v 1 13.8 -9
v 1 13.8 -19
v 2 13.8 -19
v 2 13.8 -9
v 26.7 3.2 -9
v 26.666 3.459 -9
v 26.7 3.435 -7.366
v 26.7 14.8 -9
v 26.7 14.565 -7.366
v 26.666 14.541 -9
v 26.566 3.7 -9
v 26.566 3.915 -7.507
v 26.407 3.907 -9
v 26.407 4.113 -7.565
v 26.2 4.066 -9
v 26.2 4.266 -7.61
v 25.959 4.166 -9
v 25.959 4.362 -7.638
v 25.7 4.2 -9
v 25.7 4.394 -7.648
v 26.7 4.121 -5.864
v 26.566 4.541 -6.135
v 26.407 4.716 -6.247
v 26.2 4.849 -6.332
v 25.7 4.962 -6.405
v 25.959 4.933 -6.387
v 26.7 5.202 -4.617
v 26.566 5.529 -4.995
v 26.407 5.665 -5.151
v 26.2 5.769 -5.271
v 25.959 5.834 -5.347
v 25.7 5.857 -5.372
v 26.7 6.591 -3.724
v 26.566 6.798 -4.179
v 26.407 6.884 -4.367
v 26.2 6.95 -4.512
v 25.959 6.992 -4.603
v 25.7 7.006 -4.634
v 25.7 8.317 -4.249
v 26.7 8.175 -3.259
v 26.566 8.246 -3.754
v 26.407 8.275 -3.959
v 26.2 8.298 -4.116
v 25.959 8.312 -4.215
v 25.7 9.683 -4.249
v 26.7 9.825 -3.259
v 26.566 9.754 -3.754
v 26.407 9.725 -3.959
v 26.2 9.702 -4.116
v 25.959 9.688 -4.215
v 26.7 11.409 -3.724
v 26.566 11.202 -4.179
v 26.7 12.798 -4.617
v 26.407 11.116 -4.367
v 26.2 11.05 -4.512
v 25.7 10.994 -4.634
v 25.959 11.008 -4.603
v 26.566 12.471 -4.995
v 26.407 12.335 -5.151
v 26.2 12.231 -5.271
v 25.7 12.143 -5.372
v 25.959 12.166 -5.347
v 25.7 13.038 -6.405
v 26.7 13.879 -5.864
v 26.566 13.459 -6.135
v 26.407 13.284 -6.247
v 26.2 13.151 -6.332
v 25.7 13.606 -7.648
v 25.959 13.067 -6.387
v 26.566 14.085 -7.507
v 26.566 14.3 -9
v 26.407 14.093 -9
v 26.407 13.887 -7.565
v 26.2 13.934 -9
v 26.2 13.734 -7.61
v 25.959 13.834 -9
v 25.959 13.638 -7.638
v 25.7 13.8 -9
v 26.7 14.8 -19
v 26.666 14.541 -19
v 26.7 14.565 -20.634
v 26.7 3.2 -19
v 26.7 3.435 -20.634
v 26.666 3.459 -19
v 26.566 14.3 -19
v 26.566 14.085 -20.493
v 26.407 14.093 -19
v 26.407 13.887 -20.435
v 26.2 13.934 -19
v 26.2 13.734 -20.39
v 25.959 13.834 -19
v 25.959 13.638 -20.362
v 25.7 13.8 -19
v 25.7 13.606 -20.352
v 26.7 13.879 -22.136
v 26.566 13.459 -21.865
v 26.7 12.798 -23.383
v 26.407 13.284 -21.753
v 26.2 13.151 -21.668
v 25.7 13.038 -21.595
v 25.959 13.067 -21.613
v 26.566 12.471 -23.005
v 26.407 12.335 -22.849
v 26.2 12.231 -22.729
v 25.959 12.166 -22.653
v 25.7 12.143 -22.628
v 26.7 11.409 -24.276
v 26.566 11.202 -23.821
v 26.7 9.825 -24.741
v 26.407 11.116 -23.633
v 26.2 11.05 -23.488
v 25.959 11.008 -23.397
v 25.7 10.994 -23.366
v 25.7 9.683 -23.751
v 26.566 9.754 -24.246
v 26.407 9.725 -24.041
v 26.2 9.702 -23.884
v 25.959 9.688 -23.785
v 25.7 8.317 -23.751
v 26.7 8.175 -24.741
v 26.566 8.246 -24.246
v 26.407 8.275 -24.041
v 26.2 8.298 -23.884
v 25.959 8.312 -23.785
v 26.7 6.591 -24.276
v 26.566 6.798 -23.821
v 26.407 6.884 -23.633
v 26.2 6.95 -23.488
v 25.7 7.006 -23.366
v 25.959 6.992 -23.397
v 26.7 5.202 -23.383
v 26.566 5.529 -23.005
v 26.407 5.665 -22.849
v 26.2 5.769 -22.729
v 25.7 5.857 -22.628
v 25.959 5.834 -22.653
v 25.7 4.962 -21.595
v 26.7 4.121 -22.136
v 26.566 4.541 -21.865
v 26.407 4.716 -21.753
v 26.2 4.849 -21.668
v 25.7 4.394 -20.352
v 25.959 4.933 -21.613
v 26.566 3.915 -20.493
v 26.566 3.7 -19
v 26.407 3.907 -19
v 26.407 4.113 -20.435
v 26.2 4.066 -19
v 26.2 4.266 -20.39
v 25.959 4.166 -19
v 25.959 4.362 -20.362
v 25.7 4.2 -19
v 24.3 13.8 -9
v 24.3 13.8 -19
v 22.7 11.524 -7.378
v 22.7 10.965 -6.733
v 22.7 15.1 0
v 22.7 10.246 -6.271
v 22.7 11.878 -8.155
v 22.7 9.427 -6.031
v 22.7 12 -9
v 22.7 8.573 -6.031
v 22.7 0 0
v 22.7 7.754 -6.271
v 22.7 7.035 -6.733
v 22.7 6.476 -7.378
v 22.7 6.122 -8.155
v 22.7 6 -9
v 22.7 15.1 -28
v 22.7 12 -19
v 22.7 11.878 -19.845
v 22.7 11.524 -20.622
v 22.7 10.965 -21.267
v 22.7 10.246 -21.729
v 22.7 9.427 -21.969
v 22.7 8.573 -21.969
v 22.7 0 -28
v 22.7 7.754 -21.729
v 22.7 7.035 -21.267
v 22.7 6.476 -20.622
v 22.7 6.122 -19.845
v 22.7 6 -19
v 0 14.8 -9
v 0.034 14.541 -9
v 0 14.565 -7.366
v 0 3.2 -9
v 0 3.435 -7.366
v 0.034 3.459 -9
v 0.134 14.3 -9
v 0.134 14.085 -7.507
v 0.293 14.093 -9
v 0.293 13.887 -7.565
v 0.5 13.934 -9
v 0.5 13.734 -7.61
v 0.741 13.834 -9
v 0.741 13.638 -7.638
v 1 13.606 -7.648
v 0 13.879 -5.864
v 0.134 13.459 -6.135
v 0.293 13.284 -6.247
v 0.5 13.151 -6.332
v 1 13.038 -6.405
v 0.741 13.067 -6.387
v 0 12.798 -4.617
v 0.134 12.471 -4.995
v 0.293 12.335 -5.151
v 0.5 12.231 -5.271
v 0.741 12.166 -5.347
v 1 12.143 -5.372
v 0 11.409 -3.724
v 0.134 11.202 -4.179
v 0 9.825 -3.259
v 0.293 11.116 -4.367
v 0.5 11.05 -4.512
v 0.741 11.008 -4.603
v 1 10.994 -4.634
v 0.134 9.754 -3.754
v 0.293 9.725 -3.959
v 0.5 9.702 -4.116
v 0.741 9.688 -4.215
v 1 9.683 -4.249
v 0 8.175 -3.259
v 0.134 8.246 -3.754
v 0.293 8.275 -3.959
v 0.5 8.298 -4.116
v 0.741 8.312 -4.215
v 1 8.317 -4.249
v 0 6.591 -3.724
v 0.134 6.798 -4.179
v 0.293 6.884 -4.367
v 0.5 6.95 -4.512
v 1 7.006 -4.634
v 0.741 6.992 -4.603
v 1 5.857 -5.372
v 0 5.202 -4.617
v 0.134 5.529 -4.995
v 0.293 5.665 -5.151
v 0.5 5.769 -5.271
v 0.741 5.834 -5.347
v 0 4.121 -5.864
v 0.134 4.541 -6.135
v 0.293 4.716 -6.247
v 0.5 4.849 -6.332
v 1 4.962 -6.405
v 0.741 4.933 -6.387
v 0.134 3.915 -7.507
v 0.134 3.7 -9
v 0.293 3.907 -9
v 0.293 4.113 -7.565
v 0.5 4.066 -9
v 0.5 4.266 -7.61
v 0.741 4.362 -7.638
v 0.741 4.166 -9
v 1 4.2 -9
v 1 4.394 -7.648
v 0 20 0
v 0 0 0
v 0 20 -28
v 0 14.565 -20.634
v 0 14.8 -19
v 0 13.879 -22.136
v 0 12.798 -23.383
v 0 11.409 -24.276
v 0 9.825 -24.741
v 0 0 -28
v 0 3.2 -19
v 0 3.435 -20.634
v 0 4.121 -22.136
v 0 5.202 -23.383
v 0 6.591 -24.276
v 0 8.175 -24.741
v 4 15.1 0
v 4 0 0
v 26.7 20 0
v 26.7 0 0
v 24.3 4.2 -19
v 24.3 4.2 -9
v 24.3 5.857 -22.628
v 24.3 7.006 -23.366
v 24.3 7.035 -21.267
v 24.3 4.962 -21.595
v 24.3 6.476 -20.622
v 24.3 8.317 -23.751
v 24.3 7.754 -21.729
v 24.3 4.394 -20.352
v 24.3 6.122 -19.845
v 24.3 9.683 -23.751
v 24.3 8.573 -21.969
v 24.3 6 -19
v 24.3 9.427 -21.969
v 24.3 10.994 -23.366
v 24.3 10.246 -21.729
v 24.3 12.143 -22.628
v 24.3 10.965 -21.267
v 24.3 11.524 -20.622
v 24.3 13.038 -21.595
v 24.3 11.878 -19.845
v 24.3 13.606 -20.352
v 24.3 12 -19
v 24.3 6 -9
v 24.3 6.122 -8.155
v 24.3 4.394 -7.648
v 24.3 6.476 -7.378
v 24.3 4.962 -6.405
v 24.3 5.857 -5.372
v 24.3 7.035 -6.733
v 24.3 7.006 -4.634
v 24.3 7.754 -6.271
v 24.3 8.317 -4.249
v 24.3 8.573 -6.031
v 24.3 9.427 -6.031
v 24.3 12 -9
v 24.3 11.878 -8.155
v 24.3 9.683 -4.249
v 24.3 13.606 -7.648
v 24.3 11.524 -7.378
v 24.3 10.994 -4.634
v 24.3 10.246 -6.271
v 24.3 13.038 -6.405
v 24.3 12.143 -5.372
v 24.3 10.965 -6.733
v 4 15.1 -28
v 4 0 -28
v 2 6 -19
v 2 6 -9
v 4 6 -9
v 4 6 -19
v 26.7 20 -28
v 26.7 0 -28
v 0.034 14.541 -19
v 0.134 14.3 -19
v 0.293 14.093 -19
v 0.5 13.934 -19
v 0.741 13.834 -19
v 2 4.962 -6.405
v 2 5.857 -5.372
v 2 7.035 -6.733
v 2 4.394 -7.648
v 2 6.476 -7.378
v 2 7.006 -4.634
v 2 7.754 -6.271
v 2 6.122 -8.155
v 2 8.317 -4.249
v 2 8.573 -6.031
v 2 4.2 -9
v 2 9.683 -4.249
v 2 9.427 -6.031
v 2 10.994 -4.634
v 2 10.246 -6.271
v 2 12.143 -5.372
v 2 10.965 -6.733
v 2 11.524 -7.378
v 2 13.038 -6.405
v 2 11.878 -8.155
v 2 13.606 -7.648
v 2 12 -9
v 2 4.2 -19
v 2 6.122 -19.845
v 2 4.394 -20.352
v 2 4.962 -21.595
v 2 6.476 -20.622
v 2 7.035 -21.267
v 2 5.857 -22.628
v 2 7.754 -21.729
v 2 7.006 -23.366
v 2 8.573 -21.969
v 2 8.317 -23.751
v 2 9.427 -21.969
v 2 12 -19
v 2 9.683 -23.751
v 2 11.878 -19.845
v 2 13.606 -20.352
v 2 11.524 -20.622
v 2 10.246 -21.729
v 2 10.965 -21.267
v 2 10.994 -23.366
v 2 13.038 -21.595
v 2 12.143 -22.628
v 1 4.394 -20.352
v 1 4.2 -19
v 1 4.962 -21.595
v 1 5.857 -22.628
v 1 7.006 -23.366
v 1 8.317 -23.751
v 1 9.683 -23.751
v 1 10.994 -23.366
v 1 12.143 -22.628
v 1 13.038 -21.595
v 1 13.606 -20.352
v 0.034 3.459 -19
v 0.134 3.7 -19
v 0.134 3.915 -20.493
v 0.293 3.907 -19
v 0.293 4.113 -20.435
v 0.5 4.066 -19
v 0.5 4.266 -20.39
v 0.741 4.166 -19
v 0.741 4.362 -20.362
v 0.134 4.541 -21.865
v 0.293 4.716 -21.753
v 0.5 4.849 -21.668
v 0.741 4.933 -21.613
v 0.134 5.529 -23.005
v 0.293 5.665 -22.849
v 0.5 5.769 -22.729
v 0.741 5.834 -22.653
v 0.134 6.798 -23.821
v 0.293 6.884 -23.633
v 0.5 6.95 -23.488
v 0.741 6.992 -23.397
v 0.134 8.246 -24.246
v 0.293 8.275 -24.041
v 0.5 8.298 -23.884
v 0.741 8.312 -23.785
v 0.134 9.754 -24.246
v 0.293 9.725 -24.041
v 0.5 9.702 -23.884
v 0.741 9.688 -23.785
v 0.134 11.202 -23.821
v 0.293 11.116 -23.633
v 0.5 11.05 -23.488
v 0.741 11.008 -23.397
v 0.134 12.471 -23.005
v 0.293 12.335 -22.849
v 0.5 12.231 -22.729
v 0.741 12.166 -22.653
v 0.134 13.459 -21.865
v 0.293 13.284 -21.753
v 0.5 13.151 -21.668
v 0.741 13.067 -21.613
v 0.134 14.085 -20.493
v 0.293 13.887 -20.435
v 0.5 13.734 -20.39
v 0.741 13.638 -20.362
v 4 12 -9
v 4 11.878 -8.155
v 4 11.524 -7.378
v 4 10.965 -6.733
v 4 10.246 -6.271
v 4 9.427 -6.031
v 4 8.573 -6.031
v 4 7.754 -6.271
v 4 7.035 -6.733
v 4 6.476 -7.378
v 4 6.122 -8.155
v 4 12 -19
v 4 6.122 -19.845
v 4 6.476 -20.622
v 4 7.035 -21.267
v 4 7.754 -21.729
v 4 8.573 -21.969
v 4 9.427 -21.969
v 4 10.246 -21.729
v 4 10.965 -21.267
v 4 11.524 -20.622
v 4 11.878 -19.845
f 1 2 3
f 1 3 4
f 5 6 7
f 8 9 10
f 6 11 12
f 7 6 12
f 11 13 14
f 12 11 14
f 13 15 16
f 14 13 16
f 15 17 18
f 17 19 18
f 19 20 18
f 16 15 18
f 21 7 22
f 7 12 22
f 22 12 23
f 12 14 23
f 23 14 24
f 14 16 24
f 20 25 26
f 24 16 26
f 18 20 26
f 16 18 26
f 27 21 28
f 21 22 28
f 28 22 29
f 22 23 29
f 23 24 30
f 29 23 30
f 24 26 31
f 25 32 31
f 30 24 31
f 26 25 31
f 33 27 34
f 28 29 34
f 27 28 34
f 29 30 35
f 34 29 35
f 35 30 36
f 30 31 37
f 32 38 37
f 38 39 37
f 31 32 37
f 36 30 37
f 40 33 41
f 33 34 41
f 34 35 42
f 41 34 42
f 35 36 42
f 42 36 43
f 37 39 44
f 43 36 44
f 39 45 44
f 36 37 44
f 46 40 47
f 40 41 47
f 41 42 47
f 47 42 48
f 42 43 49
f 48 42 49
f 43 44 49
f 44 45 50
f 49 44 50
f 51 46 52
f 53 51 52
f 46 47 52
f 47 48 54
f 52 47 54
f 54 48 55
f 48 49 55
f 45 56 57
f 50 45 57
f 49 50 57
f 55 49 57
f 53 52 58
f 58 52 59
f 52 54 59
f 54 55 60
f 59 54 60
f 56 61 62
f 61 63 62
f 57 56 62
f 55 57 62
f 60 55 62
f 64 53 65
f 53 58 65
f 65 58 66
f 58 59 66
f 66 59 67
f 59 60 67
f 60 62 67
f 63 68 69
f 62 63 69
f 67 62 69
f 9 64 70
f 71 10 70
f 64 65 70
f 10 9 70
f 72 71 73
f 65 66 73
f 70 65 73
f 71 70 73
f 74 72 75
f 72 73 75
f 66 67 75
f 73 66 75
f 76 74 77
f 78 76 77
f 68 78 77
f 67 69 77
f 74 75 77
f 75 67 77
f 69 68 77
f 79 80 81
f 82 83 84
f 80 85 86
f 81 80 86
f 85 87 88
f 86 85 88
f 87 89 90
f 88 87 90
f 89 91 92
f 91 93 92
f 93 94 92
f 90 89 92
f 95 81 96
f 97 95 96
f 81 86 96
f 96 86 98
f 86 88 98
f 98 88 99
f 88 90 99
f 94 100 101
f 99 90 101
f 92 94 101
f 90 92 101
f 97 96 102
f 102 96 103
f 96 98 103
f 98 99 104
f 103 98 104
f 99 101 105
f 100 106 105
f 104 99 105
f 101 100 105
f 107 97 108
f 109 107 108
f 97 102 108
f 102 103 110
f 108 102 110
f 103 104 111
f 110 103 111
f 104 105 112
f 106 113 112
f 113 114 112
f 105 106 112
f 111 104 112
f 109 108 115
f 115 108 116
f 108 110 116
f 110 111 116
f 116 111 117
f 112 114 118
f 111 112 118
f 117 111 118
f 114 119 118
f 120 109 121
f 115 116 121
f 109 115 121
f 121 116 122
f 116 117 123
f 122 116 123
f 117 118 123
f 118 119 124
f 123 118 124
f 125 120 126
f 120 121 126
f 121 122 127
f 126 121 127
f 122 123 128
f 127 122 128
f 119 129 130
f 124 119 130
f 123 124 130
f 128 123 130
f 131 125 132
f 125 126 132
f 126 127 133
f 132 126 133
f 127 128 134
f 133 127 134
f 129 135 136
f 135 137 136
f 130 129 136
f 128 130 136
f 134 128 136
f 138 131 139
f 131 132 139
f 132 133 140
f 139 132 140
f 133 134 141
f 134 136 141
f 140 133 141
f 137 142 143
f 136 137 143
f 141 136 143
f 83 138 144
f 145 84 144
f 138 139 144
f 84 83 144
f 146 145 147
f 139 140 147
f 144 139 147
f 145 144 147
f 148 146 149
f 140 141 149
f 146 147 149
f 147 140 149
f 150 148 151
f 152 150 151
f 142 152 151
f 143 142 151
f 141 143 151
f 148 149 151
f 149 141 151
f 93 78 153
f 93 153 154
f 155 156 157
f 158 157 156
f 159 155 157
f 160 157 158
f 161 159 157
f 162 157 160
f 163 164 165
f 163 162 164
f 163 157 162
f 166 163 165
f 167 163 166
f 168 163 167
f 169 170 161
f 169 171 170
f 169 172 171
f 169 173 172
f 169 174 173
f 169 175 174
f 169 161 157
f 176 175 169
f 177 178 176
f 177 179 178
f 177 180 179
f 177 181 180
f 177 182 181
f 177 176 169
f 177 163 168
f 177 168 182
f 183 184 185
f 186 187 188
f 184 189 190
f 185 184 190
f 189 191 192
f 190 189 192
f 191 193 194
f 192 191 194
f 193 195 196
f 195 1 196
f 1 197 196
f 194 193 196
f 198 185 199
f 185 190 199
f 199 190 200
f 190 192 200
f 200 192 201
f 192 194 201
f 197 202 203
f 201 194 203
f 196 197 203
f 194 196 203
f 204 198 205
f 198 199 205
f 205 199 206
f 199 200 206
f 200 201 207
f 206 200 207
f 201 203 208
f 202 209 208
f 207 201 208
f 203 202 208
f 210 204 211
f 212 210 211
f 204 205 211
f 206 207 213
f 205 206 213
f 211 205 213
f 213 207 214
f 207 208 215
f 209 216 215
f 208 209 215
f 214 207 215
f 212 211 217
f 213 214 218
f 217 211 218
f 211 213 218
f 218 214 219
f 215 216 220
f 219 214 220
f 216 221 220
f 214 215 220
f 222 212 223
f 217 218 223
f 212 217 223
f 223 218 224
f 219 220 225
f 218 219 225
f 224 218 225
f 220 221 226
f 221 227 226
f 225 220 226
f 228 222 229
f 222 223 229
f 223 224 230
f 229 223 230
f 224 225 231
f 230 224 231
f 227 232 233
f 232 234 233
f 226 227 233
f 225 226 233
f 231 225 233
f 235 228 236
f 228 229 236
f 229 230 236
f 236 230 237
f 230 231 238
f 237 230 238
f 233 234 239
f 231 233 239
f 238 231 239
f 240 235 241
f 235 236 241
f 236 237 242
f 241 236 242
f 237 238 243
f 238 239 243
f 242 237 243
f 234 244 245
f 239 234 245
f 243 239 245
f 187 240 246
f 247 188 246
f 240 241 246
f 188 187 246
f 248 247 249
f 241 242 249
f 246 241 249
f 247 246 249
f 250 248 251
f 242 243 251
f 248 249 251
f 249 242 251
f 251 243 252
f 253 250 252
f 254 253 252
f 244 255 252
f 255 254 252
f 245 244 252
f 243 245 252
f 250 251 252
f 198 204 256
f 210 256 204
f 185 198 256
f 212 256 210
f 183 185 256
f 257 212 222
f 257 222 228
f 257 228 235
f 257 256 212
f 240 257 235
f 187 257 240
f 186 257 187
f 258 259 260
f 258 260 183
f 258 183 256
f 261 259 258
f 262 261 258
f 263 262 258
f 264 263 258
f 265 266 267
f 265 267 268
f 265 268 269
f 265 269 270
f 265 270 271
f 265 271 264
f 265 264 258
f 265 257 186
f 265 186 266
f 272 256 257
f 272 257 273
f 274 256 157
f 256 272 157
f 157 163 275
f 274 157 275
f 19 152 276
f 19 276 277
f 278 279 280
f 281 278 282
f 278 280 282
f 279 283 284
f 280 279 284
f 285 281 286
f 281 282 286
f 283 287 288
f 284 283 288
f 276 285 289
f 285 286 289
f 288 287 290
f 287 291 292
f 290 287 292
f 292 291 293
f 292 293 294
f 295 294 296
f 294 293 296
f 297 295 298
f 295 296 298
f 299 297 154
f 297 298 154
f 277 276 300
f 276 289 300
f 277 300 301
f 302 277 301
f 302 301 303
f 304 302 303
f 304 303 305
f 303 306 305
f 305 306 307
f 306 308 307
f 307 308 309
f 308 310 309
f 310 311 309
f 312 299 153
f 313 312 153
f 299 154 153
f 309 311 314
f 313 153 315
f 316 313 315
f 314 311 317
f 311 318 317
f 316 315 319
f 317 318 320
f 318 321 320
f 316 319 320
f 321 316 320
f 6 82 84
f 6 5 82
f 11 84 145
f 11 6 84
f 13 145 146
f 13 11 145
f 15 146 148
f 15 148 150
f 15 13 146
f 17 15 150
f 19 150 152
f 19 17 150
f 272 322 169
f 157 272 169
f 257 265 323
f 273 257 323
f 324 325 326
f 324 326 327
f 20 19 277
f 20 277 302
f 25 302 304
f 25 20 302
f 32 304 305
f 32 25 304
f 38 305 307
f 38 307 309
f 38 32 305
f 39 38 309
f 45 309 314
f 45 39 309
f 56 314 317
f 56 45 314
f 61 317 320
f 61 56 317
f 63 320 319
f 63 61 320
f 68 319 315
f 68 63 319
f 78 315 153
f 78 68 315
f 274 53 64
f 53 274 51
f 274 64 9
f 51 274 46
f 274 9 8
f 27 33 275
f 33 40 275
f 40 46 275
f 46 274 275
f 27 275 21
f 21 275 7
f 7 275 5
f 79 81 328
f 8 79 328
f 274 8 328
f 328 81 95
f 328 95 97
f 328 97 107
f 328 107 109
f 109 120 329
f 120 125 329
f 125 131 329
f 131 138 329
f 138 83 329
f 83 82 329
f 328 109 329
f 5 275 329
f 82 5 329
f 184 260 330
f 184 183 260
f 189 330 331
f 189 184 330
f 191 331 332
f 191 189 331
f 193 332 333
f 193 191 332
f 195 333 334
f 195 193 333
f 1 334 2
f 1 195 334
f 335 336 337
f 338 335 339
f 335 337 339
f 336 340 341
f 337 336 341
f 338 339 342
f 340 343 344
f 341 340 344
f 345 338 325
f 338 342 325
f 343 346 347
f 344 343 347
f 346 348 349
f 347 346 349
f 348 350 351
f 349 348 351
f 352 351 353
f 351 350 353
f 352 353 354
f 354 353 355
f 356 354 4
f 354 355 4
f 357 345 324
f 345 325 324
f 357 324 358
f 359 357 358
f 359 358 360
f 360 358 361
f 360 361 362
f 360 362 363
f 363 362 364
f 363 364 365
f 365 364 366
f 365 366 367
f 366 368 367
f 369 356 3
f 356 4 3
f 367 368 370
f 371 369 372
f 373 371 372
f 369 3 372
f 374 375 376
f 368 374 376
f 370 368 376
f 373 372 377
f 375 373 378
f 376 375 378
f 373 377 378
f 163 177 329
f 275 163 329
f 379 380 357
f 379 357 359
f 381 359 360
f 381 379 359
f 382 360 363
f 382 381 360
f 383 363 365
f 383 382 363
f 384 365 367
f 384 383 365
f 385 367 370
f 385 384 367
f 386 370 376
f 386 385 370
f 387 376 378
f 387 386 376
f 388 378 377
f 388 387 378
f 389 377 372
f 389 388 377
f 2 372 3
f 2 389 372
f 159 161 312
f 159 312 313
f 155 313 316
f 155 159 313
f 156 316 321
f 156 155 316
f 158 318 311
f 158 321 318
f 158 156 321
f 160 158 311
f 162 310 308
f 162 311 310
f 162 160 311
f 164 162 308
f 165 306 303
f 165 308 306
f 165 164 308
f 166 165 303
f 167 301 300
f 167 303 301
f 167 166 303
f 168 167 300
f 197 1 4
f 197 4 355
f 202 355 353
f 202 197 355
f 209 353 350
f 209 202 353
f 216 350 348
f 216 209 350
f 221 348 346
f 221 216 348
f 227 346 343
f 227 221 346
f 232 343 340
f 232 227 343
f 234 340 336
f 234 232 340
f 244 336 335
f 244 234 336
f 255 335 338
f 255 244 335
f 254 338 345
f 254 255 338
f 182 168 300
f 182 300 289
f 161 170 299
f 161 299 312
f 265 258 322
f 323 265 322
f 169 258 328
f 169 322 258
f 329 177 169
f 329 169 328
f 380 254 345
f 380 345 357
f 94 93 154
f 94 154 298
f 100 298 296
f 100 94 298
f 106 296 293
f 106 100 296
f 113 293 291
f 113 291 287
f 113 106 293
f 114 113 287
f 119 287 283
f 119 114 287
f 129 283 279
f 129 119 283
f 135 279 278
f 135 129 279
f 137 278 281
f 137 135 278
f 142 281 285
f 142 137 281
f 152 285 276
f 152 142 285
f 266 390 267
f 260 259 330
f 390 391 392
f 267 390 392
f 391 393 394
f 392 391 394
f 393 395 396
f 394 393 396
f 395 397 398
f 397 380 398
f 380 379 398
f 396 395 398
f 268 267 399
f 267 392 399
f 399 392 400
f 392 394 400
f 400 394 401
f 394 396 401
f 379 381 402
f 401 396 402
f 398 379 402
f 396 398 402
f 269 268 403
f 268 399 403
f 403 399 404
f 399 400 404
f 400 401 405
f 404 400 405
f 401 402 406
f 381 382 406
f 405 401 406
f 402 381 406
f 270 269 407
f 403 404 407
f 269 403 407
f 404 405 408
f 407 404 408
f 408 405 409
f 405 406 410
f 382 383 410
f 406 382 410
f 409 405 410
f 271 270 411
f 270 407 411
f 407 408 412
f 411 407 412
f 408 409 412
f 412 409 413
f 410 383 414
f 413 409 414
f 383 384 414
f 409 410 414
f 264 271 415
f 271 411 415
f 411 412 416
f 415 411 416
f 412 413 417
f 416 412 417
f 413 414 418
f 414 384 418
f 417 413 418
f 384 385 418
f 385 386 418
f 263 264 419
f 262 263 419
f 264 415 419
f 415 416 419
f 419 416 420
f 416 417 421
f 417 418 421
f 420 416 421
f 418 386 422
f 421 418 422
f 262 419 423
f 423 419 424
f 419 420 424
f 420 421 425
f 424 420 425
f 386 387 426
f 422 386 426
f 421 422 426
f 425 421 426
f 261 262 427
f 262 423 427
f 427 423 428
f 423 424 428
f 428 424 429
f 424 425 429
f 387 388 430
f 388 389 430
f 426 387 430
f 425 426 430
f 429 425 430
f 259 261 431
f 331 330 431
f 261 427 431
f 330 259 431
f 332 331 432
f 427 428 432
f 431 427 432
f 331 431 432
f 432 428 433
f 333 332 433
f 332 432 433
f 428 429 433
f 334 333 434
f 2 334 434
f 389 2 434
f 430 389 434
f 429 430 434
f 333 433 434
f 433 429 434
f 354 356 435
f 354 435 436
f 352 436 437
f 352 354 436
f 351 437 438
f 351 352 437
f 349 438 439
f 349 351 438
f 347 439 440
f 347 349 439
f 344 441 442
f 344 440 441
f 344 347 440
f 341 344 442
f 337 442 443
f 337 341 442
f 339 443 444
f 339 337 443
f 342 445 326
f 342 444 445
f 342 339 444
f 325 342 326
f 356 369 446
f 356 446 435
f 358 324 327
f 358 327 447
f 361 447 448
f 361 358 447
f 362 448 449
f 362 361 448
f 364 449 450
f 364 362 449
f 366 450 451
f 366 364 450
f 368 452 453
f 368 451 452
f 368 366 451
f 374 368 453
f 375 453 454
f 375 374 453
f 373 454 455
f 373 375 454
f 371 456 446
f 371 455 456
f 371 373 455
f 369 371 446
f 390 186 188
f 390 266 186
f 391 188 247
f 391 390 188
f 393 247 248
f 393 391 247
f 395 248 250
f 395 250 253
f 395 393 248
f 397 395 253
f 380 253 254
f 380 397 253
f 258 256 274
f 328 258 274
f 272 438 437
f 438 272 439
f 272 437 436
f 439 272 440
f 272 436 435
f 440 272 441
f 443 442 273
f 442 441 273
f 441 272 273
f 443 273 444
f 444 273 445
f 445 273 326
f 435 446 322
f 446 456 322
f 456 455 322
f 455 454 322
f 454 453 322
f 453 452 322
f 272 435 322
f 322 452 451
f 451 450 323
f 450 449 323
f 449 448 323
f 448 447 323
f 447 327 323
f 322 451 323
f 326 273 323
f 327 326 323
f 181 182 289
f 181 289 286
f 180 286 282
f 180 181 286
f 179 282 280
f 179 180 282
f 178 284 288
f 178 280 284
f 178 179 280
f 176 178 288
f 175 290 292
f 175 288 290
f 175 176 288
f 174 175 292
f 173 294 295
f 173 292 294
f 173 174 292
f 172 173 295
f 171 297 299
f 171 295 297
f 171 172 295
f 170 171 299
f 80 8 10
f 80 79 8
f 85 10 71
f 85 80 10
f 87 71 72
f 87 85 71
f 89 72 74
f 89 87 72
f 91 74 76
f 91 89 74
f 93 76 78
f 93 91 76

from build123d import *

# Parameters (mm, degrees)
SKETCH1_W           = 26.7
SKETCH1_H           = 28
BOSS_EXTRUDE1_DEPTH = 20
CUT_EXTRUDE1_DEPTH  = 27.5
CUT_EXTRUDE2_DEPTH  = 2
CUT_EXTRUDE3_DEPTH  = 2.4
SKETCH5_W           = 18.7
SKETCH5_H           = 28
CUT_EXTRUDE4_DEPTH  = 15.1
FILLET1_R           = 1


with BuildPart() as part:
    # Sketch1 → Boss-Extrude1 (new body)
    with BuildSketch(Plane(origin=(0, 0, 0), x_dir=(1, 0, 0), z_dir=(0, 1, 0))):
        with Locations((13.35, 14)):
            Rectangle(SKETCH1_W, SKETCH1_H)
    extrude(amount=BOSS_EXTRUDE1_DEPTH)

    # Sketch2 → Cut-Extrude1 (cut)
    with BuildSketch(Plane.ZY):
        with BuildLine():
            Line((-19, 12), (-9, 12))
            ThreePointArc((-9, 12), (-6, 9), (-9, 6))
            Line((-9, 6), (-19, 6))
            ThreePointArc((-19, 6), (-22, 9), (-19, 12))
        make_face()
    extrude(amount=-CUT_EXTRUDE1_DEPTH, mode=Mode.SUBTRACT)

    # Sketch3 → Cut-Extrude2 (cut)
    with BuildSketch(Plane.ZY):
        with BuildLine():
            Line((-19, 13.8), (-9, 13.8))
            ThreePointArc((-9, 13.8), (-4.2, 9), (-9, 4.2))
            Line((-9, 4.2), (-19, 4.2))
            ThreePointArc((-19, 4.2), (-23.8, 9), (-19, 13.8))
        make_face()
    extrude(amount=-CUT_EXTRUDE2_DEPTH, mode=Mode.SUBTRACT)

    # Sketch4 → Cut-Extrude3 (cut)
    with BuildSketch(Plane(origin=(26.7, 0, 0), x_dir=(0, 0, -1), z_dir=(1, 0, 0))):
        with BuildLine():
            Line((9, 13.8), (19, 13.8))
            ThreePointArc((19, 13.8), (23.8, 9), (19, 4.2))
            Line((19, 4.2), (9, 4.2))
            ThreePointArc((9, 4.2), (4.2, 9), (9, 13.8))
        make_face()
    extrude(amount=-CUT_EXTRUDE3_DEPTH, mode=Mode.SUBTRACT)

    # Sketch5 → Cut-Extrude4 (cut)
    with BuildSketch(Plane(origin=(0, 0, 0), x_dir=(1, 0, 0), z_dir=(0, 1, 0))):
        with Locations((13.35, 14)):
            Rectangle(SKETCH5_W, SKETCH5_H)
    extrude(amount=CUT_EXTRUDE4_DEPTH, mode=Mode.SUBTRACT)

    # Fillet1
    fillet1_edges = [part.edges().sort_by_distance(p)[0] for p in [
        (0, 9, -23.8),
        (0, 4.2, -14),
        (0, 9, -4.2),
        (0, 13.8, -14),
        (26.7, 9, -4.2),
        (26.7, 4.2, -14),
        (26.7, 9, -23.8),
        (26.7, 13.8, -14),
    ]]
    fillet(fillet1_edges, radius=FILLET1_R)


solid = part.part
